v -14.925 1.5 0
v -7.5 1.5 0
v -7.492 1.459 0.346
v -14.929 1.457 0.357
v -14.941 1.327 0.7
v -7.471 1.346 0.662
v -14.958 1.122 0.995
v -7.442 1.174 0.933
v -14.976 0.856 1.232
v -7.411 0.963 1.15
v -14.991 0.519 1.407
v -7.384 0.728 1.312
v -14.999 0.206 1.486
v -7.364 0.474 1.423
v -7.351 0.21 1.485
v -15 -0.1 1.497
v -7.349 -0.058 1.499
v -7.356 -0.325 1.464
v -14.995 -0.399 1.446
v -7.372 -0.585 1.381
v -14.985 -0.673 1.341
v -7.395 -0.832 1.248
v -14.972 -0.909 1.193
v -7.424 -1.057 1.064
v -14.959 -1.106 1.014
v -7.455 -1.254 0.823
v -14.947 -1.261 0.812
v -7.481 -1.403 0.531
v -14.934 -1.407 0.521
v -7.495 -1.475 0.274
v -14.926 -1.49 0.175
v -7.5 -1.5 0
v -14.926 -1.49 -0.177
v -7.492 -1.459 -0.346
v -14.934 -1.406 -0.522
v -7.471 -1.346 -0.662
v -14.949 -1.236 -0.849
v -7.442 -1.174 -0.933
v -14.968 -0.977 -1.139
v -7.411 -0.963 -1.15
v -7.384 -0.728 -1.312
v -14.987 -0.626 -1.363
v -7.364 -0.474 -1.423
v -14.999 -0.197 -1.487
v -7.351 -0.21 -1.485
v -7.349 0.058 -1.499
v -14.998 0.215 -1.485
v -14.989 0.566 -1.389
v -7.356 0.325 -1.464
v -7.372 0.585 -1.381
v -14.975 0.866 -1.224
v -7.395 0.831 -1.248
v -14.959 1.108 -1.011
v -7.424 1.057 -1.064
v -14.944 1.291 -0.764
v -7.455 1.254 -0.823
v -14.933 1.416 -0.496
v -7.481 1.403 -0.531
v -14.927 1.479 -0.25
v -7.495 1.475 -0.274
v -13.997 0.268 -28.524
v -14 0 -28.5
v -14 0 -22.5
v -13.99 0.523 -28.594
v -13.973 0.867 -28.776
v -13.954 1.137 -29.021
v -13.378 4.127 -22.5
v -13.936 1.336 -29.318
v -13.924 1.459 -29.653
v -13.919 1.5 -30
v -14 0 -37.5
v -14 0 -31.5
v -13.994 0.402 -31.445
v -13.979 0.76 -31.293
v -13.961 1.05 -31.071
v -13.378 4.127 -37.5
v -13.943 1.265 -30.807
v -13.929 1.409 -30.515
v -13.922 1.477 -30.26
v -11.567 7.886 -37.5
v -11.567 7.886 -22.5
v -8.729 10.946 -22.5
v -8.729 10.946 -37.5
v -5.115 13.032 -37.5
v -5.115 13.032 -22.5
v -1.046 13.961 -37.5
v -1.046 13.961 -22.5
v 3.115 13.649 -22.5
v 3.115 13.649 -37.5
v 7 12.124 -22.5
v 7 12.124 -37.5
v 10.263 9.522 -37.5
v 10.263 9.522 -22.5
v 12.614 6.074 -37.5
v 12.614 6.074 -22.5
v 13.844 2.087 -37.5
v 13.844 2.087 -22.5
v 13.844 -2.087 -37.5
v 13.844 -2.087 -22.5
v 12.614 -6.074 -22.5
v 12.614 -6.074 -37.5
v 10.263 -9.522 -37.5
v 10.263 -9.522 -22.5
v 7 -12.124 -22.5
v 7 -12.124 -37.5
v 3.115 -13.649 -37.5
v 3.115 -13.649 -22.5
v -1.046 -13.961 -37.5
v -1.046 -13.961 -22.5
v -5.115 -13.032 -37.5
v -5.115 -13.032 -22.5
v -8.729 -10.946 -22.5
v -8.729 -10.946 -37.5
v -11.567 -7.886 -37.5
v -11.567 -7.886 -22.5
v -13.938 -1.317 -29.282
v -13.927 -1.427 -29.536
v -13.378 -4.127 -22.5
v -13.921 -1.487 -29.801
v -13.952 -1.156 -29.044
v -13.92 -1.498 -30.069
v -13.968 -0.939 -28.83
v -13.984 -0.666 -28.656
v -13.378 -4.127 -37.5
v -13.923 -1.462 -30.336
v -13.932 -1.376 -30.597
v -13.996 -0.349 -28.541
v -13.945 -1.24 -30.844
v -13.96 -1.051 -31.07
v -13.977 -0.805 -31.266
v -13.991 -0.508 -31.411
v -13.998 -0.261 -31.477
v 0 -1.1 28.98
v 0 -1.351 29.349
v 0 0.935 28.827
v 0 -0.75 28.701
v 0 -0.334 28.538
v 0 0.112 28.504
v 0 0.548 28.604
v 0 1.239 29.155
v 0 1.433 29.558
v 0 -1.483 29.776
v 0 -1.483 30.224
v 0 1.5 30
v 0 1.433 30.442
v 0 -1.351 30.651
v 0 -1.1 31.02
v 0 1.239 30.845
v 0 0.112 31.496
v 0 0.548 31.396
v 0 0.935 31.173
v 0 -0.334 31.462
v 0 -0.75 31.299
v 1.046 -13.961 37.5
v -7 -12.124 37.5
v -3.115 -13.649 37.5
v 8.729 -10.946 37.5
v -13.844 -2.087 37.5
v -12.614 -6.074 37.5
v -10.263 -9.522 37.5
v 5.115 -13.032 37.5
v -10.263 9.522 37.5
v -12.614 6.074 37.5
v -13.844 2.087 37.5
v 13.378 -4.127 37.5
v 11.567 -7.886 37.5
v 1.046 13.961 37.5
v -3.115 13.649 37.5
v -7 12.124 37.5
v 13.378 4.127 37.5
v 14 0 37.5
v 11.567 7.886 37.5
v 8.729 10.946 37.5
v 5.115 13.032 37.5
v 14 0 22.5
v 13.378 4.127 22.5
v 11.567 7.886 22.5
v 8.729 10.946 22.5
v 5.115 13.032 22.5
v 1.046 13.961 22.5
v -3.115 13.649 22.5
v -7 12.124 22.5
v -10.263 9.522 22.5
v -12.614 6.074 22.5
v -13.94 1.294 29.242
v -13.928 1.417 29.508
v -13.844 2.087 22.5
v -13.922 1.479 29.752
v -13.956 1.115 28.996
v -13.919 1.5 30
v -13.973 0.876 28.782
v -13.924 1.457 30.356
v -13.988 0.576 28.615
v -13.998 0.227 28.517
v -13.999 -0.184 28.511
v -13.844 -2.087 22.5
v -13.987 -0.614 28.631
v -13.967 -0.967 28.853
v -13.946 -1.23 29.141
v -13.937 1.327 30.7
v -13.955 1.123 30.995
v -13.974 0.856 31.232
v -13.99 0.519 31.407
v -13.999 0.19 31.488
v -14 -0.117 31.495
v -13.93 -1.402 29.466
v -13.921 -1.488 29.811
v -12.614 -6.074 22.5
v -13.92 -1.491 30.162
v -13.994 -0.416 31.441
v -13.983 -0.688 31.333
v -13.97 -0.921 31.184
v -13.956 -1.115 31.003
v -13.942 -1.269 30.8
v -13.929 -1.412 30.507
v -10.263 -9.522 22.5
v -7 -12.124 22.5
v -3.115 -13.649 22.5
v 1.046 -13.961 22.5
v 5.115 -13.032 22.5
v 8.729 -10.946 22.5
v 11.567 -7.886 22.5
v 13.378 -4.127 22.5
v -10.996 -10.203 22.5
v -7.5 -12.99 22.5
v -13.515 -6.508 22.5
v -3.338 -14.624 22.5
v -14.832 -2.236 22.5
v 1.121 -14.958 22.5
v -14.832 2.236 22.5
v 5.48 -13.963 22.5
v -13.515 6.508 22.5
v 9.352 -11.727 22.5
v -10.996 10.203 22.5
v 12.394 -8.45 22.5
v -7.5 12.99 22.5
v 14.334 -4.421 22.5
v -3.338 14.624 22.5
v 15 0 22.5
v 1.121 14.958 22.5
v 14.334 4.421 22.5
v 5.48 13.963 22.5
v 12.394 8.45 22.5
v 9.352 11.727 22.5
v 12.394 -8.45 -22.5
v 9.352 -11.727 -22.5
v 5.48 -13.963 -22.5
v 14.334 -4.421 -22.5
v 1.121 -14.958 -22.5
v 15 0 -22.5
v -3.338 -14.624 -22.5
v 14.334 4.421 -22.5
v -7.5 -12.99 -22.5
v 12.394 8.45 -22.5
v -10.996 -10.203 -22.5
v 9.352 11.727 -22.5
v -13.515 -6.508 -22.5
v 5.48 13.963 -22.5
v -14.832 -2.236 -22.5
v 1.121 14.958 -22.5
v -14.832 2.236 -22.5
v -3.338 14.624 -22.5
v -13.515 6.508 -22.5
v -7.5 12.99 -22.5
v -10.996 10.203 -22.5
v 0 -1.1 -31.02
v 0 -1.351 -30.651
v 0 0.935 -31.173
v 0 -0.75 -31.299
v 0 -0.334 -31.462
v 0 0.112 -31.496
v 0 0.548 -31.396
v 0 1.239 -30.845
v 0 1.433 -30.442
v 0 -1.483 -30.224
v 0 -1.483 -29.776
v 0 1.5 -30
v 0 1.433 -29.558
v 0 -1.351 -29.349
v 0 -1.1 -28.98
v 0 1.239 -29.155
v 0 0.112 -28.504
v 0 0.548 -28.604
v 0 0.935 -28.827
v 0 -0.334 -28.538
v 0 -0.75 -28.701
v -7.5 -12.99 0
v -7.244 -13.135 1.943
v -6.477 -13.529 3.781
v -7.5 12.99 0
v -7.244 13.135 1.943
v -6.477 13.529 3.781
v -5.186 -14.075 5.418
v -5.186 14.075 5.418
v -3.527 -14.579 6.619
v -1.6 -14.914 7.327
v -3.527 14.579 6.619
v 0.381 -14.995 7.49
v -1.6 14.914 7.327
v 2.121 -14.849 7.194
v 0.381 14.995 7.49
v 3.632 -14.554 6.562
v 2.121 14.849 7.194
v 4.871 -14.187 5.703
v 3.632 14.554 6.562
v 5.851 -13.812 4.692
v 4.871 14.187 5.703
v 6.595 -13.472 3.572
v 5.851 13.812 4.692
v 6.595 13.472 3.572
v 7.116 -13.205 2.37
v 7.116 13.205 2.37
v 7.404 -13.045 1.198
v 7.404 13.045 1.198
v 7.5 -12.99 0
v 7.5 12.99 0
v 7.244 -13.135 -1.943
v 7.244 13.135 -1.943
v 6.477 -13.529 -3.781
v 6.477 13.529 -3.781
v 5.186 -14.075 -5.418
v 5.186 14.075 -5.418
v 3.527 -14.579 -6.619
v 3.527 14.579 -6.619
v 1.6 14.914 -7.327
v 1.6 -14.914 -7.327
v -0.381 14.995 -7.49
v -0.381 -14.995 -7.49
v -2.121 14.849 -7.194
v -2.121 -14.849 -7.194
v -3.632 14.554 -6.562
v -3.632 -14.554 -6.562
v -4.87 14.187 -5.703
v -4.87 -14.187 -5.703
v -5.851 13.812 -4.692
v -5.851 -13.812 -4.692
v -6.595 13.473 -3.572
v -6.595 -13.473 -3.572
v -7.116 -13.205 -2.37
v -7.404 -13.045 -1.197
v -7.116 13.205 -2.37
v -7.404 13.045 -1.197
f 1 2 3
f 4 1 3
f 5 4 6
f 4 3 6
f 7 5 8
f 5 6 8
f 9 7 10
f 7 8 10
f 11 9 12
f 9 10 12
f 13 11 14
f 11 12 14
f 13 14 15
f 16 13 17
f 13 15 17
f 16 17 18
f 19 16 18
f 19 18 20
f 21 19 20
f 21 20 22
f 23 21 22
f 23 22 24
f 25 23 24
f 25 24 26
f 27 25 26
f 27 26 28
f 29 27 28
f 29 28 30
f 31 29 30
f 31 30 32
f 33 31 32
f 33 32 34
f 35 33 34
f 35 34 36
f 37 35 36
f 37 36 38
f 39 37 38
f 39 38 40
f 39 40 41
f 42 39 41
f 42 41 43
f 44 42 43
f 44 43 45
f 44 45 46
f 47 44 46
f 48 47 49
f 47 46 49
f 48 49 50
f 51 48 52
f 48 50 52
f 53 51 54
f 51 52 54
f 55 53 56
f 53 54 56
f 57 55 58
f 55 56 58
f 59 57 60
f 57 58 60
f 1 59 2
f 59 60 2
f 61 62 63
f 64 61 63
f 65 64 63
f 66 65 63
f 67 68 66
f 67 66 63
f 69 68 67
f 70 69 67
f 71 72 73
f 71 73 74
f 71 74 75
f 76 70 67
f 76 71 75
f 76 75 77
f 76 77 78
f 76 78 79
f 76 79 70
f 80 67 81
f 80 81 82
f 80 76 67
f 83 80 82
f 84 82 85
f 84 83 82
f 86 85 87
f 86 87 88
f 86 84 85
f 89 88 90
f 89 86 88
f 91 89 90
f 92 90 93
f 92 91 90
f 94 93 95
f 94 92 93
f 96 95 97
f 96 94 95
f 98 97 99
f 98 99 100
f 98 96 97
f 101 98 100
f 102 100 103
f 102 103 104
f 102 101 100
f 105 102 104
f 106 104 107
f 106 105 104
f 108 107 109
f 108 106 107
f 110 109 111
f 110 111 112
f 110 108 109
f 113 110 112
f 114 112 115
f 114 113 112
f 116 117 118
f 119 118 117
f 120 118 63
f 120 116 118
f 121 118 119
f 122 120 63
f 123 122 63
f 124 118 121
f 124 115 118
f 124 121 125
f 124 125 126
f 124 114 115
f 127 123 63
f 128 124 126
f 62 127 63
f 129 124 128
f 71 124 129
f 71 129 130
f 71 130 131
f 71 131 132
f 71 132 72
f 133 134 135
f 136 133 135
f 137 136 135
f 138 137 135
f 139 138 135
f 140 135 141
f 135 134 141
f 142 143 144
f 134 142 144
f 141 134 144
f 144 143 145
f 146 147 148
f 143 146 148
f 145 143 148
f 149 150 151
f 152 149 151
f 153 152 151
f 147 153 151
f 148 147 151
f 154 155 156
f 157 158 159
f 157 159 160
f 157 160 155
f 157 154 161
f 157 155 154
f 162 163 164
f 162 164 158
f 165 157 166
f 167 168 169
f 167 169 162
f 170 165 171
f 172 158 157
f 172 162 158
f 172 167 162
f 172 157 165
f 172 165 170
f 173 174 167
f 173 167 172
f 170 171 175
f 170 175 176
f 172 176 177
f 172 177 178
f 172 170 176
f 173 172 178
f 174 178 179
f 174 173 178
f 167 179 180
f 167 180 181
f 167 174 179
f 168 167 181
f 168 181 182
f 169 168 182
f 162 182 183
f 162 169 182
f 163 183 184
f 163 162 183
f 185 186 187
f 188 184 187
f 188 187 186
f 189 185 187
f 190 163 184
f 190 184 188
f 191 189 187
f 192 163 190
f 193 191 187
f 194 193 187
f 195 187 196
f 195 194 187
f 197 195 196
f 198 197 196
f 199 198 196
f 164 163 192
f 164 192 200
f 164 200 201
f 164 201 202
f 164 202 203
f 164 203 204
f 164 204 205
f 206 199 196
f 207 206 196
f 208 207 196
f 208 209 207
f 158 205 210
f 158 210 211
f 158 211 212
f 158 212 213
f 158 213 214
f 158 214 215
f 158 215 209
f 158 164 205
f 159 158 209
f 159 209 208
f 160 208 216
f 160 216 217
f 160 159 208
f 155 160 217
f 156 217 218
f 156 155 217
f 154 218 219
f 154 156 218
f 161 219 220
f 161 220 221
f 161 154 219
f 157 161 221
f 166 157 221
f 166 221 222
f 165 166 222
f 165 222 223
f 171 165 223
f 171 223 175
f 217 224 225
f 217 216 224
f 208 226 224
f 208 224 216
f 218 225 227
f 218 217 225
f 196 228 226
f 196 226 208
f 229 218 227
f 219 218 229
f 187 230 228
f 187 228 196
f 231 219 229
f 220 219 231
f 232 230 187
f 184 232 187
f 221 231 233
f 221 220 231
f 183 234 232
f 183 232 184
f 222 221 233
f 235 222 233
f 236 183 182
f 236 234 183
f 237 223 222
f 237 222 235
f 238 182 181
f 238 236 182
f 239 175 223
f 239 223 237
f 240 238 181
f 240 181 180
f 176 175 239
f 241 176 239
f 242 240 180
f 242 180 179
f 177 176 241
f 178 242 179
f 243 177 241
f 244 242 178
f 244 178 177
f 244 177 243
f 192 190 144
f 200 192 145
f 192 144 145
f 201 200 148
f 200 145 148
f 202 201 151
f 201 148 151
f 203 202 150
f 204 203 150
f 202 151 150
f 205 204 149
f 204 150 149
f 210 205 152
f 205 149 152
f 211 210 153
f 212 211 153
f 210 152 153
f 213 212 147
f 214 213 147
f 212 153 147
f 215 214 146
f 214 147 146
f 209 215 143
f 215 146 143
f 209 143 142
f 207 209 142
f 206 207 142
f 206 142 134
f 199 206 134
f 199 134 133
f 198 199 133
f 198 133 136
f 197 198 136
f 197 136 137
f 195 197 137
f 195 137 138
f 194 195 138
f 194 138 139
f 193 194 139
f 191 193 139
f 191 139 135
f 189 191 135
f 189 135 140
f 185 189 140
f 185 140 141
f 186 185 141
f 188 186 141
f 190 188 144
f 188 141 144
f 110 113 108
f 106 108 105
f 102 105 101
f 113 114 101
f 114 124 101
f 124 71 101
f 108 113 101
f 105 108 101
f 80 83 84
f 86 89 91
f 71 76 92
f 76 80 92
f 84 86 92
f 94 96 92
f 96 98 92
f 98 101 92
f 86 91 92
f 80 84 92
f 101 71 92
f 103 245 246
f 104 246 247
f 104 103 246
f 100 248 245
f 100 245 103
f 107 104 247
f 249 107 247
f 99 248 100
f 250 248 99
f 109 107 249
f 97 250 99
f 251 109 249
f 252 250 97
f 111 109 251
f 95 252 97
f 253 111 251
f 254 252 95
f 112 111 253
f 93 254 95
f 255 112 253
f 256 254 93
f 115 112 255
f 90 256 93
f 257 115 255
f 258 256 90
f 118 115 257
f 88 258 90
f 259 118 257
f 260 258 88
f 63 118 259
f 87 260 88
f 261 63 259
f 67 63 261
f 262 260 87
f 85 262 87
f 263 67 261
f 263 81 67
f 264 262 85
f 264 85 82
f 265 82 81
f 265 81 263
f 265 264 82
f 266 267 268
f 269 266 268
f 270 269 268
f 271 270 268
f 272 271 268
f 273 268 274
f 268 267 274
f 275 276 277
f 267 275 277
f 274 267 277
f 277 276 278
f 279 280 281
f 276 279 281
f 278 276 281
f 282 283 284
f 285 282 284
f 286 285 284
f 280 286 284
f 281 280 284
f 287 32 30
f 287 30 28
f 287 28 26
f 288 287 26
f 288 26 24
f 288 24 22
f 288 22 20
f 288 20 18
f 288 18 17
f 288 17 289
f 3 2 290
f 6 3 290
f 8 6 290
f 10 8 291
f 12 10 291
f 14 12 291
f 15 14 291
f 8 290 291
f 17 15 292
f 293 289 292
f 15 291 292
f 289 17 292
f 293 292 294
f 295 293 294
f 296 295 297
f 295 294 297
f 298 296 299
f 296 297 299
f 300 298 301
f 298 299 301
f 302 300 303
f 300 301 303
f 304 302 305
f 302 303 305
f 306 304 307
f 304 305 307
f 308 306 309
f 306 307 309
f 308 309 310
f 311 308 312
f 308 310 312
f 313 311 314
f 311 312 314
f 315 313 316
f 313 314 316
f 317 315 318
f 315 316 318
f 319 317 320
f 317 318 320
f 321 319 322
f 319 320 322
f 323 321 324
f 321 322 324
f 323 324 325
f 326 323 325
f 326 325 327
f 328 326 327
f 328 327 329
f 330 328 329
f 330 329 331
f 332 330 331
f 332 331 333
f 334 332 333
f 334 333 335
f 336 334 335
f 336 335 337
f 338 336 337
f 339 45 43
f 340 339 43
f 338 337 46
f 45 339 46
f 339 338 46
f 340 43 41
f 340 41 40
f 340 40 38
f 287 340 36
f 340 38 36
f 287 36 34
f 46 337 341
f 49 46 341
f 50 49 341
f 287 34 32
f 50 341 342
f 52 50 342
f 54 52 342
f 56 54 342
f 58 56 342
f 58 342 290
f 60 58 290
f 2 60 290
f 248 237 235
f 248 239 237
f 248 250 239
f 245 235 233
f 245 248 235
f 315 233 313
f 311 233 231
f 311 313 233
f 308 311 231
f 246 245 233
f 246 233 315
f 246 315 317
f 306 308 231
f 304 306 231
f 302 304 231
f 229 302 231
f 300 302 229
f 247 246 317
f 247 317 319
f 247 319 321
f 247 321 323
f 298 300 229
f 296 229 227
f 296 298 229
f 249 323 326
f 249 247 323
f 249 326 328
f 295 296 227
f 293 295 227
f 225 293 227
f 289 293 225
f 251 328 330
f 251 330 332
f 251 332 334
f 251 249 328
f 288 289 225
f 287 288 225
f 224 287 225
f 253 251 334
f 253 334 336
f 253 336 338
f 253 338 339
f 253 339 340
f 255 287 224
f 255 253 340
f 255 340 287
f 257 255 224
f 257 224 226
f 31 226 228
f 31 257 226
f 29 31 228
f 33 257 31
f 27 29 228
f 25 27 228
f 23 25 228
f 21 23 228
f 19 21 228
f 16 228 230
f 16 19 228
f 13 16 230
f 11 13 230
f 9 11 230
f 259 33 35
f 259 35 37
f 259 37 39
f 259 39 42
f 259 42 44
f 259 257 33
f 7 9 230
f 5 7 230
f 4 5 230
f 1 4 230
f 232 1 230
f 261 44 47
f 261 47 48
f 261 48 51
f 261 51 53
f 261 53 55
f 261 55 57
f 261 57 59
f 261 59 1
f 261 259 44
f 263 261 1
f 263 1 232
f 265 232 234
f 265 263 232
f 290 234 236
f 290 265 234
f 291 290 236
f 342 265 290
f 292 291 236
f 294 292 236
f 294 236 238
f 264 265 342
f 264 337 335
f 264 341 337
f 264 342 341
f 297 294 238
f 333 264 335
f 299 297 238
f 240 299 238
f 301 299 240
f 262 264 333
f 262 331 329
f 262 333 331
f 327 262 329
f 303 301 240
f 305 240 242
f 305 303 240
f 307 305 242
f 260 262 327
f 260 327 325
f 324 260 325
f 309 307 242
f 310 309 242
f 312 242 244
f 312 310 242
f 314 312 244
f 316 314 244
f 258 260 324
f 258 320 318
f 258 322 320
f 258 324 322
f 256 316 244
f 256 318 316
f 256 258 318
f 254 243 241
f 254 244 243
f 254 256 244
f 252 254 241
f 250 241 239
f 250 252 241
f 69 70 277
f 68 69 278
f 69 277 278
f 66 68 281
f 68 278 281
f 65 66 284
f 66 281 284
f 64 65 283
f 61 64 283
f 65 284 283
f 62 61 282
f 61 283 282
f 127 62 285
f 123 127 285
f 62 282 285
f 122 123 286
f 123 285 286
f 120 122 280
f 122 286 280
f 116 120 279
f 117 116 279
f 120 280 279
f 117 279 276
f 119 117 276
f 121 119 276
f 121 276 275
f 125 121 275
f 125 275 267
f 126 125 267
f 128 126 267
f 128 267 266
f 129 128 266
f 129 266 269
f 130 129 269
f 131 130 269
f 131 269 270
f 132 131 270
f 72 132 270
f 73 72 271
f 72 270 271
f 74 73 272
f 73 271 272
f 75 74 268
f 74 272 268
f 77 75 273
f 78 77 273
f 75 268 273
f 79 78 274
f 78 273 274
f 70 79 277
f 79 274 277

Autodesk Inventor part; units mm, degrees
ref_plane "YZ Plane" through (0, 0, 0) normal (1, 0, 0) x (0, 1, 0)
ref_plane "XZ Plane" through (0, 0, 0) normal (0, 1, 0) x (-1, 0, 0)
ref_plane "XY Plane" through (0, 0, 0) normal (0, 0, 1) x (1, 0, 0)
sketch "Szkic1" plane through (0, 0, 0) normal (0, 0, 1) x (1, 0, 0)
  circle A0 centre (0, 0) radius 15
  dimension "d0" = 30
extrude "Wyciągnięcie proste1" add sketch "Szkic1" along normal mid plane 75
sketch "Szkic2" plane through (0, 0, 0) normal (0, 1, 0) x (-1, 0, 0)
  circle A0 centre (0, 0) radius 7.5
  dimension "d3" = 15
extrude "Wyciągnięcie proste2" cut sketch "Szkic2" along normal mid plane 35
sketch "Szkic3" plane through (0, 0, 37.5) normal (0, 0, 1) x (1, 0, 0)
  circle A0 centre (0, 0) radius 14
  circle A1 centre (0, 0) radius 15
  dimension "d6" = 28
  dimension "d7" = 30
extrude "Wyciągnięcie proste3" cut sketch "Szkic3" against normal blind 15
sketch "Szkic4" plane through (0, 0, -37.5) normal (0, 0, -1) x (-1, 0, 0)
  circle A0 centre (0, 0) radius 14
  circle A1 centre (0, 0) radius 15
  dimension "d10" = 28
  dimension "d11" = 30
extrude "Wyciągnięcie proste4" cut sketch "Szkic4" against normal blind 15
sketch "Szkic6" plane through (0, 0, 0) normal (1, 0, 0) x (0, 1, 0)
  circle A0 centre (0, 0) radius 1.5
  circle A1 centre (0, -30) radius 1.5
  circle A2 centre (0, 30) radius 1.5
  dimension "d18" = 3
  dimension "d19" = 3
  dimension "d20" = 3
extrude "Wyciągnięcie proste6" cut sketch "Szkic6" against normal blind 30
properties part number "srodek" material "Aluminium 6061"
